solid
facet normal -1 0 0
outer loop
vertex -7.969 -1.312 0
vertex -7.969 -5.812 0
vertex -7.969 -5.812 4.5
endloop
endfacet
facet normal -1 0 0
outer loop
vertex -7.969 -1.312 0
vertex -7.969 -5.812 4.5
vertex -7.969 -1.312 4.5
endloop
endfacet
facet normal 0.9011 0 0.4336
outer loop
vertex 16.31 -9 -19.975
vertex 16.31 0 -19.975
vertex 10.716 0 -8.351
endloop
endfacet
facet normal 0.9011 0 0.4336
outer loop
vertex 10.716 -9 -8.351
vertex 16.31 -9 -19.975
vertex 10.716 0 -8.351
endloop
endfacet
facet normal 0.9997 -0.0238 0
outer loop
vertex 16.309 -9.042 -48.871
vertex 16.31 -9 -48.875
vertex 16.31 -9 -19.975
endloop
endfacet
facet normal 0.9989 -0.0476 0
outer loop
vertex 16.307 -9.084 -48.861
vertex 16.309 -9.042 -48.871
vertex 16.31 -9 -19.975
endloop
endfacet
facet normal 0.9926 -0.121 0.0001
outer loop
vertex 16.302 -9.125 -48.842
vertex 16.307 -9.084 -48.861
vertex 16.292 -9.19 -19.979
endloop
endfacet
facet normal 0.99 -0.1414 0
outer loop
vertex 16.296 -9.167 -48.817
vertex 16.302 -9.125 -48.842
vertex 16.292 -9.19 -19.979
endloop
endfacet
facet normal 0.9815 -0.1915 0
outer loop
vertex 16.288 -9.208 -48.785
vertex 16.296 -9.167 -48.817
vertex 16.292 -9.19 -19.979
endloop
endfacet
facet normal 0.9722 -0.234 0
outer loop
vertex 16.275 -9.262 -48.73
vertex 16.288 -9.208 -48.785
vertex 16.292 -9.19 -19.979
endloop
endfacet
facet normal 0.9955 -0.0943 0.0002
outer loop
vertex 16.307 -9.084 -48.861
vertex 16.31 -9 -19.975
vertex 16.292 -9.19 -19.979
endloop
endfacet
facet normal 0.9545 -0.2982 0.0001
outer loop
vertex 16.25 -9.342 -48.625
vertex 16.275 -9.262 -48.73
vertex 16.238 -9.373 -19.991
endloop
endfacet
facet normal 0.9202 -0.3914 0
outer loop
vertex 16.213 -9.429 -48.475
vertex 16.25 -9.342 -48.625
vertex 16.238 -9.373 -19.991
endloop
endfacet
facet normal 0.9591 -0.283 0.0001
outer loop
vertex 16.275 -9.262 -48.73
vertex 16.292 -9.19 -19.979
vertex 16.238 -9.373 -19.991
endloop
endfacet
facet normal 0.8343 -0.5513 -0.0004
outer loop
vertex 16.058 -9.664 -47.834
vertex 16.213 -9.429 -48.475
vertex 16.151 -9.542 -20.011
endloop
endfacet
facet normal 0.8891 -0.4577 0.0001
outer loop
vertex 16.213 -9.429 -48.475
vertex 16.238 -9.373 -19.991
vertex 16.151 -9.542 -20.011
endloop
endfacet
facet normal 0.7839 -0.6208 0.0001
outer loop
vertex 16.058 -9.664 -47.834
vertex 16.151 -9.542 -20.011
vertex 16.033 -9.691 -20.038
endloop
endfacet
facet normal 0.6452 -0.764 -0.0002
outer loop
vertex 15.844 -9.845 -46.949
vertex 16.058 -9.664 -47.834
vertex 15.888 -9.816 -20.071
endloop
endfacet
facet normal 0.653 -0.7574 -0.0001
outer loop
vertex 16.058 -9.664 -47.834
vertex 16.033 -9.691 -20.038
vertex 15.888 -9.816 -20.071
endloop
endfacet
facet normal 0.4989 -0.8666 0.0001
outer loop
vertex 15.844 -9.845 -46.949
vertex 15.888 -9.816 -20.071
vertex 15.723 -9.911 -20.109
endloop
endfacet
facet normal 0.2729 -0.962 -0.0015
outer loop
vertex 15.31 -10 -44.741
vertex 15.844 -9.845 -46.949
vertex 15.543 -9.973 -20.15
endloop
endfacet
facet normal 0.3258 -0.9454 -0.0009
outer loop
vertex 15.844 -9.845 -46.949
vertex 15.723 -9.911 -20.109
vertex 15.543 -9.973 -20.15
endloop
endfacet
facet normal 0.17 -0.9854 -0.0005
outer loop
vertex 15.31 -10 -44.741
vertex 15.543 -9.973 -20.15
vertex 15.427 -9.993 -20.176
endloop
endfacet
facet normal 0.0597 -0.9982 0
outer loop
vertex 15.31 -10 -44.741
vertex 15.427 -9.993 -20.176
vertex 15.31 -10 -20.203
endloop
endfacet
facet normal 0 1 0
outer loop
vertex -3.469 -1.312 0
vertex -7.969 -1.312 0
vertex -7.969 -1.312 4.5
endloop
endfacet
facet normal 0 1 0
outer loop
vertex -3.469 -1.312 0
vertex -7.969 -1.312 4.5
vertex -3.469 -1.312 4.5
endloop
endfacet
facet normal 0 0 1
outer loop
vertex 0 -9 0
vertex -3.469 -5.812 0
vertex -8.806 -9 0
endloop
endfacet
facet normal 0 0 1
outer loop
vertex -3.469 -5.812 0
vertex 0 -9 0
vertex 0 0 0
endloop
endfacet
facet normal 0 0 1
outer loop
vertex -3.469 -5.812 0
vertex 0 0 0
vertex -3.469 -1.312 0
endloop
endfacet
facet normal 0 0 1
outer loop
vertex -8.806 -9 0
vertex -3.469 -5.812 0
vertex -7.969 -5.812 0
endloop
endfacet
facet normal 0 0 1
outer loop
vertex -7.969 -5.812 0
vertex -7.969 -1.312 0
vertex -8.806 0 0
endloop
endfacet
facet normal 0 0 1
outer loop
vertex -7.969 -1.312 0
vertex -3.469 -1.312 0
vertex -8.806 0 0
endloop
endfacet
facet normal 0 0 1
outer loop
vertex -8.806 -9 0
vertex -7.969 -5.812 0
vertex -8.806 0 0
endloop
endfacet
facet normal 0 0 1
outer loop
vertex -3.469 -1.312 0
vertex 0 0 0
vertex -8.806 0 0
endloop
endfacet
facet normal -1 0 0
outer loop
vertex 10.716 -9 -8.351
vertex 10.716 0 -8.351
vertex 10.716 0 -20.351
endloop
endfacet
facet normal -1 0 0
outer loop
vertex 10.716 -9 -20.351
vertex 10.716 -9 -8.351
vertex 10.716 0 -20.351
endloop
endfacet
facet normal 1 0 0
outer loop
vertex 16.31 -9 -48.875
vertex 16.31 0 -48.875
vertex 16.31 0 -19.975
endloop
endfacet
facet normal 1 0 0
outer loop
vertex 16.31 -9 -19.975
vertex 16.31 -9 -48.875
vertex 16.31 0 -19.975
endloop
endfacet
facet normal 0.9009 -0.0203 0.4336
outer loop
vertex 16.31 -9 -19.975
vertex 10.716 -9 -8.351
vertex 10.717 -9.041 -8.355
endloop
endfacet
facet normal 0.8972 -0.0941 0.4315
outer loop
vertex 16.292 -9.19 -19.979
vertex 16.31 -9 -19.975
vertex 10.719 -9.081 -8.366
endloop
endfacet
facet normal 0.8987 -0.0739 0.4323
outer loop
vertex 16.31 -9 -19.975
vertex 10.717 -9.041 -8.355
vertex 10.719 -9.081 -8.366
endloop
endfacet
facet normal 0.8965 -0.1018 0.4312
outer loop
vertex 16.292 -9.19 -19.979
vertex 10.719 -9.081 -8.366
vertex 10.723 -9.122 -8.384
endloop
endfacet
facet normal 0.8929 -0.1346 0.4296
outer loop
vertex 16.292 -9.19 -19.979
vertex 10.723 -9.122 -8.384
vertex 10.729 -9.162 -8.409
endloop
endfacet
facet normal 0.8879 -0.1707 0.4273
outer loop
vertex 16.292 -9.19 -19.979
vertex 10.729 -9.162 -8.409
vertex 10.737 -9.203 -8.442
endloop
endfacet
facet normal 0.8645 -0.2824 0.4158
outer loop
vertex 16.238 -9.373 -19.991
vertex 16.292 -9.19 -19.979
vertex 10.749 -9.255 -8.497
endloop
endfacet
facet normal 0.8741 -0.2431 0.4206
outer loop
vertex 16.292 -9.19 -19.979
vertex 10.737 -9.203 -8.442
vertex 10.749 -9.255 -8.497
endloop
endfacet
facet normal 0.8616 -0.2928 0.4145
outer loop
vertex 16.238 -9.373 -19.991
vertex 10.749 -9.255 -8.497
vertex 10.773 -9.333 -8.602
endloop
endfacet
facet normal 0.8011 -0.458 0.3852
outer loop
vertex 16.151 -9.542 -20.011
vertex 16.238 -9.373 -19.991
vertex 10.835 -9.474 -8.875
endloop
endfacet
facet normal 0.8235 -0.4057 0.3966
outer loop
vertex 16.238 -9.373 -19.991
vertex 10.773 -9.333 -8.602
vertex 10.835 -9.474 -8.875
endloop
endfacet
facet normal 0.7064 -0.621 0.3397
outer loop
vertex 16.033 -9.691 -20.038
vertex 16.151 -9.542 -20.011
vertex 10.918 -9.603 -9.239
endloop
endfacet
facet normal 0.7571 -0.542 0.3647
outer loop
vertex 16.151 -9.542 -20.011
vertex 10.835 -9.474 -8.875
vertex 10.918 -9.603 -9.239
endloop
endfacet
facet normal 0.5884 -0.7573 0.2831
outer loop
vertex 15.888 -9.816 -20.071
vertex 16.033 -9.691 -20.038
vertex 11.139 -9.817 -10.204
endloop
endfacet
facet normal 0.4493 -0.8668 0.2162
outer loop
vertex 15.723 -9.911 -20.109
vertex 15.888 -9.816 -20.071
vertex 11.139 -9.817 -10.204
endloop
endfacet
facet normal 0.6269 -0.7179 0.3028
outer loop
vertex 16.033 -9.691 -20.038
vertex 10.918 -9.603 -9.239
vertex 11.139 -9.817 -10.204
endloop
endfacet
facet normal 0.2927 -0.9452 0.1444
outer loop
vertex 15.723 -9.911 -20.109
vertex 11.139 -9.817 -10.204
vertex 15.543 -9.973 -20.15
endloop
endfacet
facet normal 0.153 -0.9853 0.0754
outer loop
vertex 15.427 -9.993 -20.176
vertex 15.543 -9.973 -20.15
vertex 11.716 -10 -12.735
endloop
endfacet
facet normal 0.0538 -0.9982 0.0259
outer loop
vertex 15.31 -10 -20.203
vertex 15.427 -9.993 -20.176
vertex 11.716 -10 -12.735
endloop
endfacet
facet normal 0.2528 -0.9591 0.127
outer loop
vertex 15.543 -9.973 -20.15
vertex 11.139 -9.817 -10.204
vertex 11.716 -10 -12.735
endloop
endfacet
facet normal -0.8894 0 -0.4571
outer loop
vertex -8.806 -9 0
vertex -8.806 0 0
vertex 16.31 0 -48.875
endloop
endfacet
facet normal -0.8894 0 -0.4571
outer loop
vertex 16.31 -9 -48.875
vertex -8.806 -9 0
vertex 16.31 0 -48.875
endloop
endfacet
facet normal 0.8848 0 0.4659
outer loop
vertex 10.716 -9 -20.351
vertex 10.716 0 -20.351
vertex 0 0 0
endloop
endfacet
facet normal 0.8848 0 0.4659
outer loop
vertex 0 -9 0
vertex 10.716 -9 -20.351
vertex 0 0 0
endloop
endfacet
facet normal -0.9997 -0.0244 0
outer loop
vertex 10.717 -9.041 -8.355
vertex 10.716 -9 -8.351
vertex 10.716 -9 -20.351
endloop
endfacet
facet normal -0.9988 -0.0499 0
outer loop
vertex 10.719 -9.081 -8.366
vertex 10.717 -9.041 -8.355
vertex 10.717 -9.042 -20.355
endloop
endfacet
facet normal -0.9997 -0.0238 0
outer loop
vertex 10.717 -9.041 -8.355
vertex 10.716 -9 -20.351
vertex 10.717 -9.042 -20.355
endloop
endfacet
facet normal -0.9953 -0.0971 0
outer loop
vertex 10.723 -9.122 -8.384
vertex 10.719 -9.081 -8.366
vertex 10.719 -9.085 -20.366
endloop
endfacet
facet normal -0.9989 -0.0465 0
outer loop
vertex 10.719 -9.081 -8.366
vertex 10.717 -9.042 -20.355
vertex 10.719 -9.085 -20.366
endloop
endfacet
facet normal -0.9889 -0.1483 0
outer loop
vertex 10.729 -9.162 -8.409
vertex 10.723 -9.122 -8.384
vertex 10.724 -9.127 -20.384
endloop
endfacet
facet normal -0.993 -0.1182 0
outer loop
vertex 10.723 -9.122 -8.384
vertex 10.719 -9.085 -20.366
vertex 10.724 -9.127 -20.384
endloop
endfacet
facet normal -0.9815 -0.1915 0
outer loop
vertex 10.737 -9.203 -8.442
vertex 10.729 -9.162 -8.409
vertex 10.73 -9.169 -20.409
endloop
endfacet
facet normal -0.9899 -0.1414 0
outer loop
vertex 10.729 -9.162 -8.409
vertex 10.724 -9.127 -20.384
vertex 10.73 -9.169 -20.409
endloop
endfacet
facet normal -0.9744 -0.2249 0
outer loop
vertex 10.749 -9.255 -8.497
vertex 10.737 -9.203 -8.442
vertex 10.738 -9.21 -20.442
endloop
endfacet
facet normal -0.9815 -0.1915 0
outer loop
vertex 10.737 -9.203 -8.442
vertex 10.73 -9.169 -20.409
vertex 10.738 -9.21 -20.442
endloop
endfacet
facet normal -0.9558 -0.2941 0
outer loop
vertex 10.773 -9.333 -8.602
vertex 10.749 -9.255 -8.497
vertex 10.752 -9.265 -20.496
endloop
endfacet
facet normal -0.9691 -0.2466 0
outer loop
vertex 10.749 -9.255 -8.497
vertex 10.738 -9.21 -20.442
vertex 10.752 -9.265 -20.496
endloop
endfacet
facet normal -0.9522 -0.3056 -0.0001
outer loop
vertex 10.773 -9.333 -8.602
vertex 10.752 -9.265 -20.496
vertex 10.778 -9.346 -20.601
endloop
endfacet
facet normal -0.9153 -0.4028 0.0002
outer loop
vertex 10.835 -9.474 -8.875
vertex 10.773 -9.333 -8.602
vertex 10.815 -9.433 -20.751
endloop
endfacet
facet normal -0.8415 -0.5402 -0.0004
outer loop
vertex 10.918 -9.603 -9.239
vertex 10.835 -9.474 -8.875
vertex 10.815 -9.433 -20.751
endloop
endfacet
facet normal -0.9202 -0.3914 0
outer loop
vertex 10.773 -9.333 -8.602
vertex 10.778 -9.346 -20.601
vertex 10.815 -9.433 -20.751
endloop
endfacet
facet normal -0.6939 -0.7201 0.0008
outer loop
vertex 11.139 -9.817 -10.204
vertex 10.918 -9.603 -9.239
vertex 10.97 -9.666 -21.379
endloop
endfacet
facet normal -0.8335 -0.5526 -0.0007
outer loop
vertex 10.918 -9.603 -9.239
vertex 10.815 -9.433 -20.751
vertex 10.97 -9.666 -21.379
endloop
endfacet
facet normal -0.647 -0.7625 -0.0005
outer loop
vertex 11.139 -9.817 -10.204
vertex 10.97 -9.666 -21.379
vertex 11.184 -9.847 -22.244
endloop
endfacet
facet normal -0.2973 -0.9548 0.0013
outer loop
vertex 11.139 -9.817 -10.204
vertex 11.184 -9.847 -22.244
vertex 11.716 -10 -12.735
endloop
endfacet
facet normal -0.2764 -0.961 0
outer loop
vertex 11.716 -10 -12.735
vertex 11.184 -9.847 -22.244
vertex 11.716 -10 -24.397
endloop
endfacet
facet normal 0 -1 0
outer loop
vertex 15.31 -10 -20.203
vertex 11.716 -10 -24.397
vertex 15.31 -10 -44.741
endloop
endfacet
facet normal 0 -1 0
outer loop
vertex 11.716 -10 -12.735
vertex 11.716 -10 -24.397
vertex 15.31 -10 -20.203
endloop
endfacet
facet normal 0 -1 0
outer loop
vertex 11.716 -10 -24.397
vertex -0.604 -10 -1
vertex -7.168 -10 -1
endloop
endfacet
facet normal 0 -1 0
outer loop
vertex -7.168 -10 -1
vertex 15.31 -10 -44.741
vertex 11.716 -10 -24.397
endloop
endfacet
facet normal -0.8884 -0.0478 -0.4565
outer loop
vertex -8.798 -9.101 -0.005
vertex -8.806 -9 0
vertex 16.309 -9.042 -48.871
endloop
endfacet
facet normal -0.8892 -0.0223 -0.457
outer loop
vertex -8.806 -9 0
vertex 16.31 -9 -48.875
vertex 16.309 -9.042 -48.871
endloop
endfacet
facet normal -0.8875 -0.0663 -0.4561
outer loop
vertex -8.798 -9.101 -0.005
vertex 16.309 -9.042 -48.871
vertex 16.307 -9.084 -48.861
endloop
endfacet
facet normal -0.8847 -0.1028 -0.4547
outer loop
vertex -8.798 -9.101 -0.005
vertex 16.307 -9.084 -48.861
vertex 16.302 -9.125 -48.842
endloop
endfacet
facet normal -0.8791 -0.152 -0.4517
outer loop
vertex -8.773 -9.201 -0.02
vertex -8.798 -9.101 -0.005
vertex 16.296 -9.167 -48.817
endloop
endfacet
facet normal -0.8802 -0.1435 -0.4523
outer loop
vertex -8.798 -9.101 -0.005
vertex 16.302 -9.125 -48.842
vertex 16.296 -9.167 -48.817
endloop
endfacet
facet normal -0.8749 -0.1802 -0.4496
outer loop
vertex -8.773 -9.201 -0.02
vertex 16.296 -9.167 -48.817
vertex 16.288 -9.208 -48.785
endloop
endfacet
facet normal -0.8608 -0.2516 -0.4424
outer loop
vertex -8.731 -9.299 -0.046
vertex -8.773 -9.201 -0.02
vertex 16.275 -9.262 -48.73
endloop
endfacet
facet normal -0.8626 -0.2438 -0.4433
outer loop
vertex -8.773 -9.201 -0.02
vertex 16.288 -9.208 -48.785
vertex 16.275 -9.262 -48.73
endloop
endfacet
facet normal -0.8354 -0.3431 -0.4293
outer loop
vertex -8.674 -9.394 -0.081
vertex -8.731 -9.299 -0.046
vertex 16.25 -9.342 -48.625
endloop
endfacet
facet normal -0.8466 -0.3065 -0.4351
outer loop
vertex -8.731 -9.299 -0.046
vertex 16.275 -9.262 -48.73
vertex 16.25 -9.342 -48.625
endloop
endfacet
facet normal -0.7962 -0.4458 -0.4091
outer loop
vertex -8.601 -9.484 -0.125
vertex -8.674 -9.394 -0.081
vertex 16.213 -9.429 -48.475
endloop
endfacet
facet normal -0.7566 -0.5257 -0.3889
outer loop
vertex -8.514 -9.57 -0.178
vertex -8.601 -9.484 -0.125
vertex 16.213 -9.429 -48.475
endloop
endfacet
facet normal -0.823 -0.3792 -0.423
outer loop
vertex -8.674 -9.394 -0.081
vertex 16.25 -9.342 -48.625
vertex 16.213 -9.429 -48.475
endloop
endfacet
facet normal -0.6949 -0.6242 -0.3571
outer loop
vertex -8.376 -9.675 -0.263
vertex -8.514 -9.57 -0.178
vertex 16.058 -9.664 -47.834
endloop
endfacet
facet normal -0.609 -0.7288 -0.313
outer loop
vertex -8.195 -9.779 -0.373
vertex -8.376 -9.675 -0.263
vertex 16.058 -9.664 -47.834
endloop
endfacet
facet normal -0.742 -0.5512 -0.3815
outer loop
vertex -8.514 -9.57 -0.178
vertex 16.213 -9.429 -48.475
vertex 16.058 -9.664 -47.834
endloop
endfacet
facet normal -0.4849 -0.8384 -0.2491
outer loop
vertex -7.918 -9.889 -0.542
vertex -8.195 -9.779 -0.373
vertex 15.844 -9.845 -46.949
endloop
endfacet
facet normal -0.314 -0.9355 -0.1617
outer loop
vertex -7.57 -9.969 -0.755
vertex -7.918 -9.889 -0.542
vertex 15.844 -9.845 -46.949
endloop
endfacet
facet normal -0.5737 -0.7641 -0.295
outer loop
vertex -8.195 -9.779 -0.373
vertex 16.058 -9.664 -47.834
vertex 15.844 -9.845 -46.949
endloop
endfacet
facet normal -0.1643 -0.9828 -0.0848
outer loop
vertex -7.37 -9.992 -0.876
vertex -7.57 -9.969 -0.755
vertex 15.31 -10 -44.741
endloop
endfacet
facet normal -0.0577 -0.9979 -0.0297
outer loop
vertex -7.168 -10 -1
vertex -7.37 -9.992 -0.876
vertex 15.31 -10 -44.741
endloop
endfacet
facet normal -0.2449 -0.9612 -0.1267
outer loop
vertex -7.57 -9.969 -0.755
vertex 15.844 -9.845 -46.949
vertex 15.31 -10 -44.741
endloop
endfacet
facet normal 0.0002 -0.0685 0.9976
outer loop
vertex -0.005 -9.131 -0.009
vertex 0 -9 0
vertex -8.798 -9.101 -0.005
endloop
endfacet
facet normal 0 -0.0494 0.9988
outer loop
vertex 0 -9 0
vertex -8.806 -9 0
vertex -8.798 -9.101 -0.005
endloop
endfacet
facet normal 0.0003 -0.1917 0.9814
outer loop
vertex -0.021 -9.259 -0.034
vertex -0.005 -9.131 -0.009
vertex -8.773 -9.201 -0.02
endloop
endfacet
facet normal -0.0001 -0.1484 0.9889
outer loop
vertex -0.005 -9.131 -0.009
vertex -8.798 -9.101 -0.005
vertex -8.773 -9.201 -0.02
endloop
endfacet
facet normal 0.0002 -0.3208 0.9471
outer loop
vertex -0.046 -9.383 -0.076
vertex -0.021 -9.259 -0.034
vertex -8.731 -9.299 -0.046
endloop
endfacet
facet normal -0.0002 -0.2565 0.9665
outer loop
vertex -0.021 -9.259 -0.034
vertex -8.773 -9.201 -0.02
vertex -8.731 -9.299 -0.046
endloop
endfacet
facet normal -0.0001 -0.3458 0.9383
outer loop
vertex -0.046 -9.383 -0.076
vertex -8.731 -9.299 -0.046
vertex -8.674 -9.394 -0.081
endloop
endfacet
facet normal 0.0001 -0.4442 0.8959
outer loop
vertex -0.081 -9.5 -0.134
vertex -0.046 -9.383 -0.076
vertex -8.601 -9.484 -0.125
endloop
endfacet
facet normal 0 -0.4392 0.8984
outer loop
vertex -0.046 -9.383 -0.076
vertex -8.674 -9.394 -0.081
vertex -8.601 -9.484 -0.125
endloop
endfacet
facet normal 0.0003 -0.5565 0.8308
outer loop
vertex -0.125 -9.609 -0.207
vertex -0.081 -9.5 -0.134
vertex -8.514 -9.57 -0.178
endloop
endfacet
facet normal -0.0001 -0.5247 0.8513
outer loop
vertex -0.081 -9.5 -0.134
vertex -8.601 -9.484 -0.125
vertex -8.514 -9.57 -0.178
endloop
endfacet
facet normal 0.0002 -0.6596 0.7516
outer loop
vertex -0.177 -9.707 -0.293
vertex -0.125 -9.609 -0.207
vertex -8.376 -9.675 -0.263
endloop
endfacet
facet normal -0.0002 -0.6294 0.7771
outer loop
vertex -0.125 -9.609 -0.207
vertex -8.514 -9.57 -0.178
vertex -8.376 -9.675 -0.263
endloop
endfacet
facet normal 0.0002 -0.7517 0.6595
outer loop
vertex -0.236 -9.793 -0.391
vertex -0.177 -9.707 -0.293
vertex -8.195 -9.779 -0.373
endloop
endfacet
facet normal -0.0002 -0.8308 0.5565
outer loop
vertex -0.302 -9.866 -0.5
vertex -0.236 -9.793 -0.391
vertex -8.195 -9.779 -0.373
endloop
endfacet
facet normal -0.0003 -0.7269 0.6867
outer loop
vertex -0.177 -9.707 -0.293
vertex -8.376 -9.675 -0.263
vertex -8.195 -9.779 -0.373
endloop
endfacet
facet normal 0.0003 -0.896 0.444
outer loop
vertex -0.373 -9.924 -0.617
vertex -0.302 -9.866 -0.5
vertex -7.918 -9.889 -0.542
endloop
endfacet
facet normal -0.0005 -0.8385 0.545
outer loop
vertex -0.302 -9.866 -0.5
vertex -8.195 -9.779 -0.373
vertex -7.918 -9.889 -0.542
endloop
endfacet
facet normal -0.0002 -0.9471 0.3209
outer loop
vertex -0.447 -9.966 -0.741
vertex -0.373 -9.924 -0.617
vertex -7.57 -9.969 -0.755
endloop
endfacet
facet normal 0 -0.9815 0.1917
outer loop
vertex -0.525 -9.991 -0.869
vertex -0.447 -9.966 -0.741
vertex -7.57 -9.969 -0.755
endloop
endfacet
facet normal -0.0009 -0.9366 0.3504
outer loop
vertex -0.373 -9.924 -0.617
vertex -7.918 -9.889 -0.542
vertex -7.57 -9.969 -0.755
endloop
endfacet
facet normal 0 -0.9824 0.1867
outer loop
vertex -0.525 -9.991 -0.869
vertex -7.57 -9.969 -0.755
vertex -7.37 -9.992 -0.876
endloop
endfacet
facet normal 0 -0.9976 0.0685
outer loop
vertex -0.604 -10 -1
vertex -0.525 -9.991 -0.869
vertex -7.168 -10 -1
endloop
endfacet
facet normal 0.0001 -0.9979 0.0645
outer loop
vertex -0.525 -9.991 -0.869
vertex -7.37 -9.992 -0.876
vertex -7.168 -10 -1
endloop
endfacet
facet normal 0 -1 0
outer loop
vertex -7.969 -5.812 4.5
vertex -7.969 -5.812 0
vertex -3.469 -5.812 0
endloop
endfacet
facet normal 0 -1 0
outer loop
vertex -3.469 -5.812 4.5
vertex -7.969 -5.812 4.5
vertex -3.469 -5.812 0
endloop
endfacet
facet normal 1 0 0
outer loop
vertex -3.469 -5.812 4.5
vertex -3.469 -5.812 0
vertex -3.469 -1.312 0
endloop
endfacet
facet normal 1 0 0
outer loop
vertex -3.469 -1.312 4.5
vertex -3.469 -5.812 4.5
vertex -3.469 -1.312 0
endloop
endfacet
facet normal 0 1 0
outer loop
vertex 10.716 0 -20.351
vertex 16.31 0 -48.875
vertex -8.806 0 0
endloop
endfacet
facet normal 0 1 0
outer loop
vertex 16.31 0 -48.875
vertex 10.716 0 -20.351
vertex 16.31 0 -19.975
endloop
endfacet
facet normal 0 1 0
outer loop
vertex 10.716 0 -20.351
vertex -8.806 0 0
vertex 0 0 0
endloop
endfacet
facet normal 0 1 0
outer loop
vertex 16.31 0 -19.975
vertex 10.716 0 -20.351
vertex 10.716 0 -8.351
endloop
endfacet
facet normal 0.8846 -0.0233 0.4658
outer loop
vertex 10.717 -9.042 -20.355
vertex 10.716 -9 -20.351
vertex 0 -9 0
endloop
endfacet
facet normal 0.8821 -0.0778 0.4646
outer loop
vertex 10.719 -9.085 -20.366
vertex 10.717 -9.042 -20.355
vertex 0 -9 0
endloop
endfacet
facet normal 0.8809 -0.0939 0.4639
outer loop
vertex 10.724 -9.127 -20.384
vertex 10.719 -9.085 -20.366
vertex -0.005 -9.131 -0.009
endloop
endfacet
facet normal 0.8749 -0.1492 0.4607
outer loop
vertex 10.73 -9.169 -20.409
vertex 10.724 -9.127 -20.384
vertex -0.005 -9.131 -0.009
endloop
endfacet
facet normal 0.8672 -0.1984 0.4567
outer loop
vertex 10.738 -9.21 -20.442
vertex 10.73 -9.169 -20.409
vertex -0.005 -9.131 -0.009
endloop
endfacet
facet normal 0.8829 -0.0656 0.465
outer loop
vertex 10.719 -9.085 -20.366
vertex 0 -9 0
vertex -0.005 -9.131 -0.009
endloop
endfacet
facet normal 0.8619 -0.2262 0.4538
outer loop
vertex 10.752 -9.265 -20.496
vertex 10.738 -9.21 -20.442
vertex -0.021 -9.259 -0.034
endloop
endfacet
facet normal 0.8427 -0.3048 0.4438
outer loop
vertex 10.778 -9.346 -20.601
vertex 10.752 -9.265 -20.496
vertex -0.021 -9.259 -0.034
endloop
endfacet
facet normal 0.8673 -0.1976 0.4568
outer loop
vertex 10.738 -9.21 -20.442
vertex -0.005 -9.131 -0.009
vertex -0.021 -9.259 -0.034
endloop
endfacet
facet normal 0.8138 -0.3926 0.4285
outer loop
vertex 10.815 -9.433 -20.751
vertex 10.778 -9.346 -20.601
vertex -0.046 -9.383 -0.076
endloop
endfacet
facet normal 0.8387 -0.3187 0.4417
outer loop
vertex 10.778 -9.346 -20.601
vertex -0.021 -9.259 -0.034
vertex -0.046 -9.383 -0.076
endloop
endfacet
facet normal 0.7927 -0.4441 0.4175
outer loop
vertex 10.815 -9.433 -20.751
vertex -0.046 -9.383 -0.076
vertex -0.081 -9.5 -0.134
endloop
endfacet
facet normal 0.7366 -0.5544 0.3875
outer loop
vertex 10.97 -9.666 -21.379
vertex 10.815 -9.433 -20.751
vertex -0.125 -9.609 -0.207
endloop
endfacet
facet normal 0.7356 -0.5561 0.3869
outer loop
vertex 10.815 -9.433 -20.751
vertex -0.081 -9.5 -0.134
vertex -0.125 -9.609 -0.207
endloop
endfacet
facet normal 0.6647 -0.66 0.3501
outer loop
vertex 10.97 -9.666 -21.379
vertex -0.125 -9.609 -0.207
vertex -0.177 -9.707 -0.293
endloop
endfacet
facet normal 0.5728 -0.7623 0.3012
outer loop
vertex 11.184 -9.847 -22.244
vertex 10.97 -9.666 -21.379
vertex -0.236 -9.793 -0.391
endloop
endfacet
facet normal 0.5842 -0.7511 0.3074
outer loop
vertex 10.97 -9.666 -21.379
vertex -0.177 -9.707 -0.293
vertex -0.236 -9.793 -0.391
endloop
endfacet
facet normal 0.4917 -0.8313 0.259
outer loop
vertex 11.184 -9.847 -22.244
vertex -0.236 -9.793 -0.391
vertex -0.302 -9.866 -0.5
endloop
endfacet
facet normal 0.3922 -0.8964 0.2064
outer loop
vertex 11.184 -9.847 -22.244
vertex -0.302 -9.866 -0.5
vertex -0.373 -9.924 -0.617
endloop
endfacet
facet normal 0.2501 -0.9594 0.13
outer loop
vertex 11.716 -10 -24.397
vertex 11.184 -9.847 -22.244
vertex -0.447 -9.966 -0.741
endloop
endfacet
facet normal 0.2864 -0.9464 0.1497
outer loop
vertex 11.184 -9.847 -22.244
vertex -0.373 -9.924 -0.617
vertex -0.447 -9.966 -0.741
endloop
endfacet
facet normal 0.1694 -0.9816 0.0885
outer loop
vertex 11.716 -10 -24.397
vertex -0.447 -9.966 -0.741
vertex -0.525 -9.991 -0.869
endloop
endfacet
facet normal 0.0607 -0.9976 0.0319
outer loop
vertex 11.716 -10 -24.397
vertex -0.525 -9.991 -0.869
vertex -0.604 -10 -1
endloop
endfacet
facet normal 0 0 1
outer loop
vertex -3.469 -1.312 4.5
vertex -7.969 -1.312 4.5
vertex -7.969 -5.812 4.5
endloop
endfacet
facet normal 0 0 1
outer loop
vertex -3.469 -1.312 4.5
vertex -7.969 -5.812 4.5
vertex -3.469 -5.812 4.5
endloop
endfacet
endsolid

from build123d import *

# Parameters (mm, degrees)
F1_DEPTH = 10
F2_R     = 1
F3_W     = 4.5
F3_H     = 4.5
F4_DEPTH = 4.5


with BuildPart() as f1:
    # F0 (on Front) → F1 (new body)
    with BuildSketch(Plane.XZ):
        Polygon((10.715883, -20.351163), (0, 0), (-8.806125, 0), (16.310085, -48.875057), (16.310085, -19.975057), (10.715883, -8.351163), align=None)
    extrude(amount=F1_DEPTH)

    # F2
    f2_edges = [f1.edges().sort_by_distance(p)[0] for p in [
        (13.512984, -10, -14.16311),
        (3.75198, -10, -24.437528),
        (5.357942, -10, -10.175582),
        (10.715883, -10, -14.351163),
        (16.310085, -10, -34.425057),
        (-4.403063, -10, 0),
    ]]
    fillet(f2_edges, radius=F2_R)

    # F3 (on face) → F4 (join)
    with BuildSketch(Plane.XY):
        with Locations((-5.718835, -3.562355)):
            Rectangle(F3_W, F3_H)
    extrude(amount=F4_DEPTH)


solid = f1.part
